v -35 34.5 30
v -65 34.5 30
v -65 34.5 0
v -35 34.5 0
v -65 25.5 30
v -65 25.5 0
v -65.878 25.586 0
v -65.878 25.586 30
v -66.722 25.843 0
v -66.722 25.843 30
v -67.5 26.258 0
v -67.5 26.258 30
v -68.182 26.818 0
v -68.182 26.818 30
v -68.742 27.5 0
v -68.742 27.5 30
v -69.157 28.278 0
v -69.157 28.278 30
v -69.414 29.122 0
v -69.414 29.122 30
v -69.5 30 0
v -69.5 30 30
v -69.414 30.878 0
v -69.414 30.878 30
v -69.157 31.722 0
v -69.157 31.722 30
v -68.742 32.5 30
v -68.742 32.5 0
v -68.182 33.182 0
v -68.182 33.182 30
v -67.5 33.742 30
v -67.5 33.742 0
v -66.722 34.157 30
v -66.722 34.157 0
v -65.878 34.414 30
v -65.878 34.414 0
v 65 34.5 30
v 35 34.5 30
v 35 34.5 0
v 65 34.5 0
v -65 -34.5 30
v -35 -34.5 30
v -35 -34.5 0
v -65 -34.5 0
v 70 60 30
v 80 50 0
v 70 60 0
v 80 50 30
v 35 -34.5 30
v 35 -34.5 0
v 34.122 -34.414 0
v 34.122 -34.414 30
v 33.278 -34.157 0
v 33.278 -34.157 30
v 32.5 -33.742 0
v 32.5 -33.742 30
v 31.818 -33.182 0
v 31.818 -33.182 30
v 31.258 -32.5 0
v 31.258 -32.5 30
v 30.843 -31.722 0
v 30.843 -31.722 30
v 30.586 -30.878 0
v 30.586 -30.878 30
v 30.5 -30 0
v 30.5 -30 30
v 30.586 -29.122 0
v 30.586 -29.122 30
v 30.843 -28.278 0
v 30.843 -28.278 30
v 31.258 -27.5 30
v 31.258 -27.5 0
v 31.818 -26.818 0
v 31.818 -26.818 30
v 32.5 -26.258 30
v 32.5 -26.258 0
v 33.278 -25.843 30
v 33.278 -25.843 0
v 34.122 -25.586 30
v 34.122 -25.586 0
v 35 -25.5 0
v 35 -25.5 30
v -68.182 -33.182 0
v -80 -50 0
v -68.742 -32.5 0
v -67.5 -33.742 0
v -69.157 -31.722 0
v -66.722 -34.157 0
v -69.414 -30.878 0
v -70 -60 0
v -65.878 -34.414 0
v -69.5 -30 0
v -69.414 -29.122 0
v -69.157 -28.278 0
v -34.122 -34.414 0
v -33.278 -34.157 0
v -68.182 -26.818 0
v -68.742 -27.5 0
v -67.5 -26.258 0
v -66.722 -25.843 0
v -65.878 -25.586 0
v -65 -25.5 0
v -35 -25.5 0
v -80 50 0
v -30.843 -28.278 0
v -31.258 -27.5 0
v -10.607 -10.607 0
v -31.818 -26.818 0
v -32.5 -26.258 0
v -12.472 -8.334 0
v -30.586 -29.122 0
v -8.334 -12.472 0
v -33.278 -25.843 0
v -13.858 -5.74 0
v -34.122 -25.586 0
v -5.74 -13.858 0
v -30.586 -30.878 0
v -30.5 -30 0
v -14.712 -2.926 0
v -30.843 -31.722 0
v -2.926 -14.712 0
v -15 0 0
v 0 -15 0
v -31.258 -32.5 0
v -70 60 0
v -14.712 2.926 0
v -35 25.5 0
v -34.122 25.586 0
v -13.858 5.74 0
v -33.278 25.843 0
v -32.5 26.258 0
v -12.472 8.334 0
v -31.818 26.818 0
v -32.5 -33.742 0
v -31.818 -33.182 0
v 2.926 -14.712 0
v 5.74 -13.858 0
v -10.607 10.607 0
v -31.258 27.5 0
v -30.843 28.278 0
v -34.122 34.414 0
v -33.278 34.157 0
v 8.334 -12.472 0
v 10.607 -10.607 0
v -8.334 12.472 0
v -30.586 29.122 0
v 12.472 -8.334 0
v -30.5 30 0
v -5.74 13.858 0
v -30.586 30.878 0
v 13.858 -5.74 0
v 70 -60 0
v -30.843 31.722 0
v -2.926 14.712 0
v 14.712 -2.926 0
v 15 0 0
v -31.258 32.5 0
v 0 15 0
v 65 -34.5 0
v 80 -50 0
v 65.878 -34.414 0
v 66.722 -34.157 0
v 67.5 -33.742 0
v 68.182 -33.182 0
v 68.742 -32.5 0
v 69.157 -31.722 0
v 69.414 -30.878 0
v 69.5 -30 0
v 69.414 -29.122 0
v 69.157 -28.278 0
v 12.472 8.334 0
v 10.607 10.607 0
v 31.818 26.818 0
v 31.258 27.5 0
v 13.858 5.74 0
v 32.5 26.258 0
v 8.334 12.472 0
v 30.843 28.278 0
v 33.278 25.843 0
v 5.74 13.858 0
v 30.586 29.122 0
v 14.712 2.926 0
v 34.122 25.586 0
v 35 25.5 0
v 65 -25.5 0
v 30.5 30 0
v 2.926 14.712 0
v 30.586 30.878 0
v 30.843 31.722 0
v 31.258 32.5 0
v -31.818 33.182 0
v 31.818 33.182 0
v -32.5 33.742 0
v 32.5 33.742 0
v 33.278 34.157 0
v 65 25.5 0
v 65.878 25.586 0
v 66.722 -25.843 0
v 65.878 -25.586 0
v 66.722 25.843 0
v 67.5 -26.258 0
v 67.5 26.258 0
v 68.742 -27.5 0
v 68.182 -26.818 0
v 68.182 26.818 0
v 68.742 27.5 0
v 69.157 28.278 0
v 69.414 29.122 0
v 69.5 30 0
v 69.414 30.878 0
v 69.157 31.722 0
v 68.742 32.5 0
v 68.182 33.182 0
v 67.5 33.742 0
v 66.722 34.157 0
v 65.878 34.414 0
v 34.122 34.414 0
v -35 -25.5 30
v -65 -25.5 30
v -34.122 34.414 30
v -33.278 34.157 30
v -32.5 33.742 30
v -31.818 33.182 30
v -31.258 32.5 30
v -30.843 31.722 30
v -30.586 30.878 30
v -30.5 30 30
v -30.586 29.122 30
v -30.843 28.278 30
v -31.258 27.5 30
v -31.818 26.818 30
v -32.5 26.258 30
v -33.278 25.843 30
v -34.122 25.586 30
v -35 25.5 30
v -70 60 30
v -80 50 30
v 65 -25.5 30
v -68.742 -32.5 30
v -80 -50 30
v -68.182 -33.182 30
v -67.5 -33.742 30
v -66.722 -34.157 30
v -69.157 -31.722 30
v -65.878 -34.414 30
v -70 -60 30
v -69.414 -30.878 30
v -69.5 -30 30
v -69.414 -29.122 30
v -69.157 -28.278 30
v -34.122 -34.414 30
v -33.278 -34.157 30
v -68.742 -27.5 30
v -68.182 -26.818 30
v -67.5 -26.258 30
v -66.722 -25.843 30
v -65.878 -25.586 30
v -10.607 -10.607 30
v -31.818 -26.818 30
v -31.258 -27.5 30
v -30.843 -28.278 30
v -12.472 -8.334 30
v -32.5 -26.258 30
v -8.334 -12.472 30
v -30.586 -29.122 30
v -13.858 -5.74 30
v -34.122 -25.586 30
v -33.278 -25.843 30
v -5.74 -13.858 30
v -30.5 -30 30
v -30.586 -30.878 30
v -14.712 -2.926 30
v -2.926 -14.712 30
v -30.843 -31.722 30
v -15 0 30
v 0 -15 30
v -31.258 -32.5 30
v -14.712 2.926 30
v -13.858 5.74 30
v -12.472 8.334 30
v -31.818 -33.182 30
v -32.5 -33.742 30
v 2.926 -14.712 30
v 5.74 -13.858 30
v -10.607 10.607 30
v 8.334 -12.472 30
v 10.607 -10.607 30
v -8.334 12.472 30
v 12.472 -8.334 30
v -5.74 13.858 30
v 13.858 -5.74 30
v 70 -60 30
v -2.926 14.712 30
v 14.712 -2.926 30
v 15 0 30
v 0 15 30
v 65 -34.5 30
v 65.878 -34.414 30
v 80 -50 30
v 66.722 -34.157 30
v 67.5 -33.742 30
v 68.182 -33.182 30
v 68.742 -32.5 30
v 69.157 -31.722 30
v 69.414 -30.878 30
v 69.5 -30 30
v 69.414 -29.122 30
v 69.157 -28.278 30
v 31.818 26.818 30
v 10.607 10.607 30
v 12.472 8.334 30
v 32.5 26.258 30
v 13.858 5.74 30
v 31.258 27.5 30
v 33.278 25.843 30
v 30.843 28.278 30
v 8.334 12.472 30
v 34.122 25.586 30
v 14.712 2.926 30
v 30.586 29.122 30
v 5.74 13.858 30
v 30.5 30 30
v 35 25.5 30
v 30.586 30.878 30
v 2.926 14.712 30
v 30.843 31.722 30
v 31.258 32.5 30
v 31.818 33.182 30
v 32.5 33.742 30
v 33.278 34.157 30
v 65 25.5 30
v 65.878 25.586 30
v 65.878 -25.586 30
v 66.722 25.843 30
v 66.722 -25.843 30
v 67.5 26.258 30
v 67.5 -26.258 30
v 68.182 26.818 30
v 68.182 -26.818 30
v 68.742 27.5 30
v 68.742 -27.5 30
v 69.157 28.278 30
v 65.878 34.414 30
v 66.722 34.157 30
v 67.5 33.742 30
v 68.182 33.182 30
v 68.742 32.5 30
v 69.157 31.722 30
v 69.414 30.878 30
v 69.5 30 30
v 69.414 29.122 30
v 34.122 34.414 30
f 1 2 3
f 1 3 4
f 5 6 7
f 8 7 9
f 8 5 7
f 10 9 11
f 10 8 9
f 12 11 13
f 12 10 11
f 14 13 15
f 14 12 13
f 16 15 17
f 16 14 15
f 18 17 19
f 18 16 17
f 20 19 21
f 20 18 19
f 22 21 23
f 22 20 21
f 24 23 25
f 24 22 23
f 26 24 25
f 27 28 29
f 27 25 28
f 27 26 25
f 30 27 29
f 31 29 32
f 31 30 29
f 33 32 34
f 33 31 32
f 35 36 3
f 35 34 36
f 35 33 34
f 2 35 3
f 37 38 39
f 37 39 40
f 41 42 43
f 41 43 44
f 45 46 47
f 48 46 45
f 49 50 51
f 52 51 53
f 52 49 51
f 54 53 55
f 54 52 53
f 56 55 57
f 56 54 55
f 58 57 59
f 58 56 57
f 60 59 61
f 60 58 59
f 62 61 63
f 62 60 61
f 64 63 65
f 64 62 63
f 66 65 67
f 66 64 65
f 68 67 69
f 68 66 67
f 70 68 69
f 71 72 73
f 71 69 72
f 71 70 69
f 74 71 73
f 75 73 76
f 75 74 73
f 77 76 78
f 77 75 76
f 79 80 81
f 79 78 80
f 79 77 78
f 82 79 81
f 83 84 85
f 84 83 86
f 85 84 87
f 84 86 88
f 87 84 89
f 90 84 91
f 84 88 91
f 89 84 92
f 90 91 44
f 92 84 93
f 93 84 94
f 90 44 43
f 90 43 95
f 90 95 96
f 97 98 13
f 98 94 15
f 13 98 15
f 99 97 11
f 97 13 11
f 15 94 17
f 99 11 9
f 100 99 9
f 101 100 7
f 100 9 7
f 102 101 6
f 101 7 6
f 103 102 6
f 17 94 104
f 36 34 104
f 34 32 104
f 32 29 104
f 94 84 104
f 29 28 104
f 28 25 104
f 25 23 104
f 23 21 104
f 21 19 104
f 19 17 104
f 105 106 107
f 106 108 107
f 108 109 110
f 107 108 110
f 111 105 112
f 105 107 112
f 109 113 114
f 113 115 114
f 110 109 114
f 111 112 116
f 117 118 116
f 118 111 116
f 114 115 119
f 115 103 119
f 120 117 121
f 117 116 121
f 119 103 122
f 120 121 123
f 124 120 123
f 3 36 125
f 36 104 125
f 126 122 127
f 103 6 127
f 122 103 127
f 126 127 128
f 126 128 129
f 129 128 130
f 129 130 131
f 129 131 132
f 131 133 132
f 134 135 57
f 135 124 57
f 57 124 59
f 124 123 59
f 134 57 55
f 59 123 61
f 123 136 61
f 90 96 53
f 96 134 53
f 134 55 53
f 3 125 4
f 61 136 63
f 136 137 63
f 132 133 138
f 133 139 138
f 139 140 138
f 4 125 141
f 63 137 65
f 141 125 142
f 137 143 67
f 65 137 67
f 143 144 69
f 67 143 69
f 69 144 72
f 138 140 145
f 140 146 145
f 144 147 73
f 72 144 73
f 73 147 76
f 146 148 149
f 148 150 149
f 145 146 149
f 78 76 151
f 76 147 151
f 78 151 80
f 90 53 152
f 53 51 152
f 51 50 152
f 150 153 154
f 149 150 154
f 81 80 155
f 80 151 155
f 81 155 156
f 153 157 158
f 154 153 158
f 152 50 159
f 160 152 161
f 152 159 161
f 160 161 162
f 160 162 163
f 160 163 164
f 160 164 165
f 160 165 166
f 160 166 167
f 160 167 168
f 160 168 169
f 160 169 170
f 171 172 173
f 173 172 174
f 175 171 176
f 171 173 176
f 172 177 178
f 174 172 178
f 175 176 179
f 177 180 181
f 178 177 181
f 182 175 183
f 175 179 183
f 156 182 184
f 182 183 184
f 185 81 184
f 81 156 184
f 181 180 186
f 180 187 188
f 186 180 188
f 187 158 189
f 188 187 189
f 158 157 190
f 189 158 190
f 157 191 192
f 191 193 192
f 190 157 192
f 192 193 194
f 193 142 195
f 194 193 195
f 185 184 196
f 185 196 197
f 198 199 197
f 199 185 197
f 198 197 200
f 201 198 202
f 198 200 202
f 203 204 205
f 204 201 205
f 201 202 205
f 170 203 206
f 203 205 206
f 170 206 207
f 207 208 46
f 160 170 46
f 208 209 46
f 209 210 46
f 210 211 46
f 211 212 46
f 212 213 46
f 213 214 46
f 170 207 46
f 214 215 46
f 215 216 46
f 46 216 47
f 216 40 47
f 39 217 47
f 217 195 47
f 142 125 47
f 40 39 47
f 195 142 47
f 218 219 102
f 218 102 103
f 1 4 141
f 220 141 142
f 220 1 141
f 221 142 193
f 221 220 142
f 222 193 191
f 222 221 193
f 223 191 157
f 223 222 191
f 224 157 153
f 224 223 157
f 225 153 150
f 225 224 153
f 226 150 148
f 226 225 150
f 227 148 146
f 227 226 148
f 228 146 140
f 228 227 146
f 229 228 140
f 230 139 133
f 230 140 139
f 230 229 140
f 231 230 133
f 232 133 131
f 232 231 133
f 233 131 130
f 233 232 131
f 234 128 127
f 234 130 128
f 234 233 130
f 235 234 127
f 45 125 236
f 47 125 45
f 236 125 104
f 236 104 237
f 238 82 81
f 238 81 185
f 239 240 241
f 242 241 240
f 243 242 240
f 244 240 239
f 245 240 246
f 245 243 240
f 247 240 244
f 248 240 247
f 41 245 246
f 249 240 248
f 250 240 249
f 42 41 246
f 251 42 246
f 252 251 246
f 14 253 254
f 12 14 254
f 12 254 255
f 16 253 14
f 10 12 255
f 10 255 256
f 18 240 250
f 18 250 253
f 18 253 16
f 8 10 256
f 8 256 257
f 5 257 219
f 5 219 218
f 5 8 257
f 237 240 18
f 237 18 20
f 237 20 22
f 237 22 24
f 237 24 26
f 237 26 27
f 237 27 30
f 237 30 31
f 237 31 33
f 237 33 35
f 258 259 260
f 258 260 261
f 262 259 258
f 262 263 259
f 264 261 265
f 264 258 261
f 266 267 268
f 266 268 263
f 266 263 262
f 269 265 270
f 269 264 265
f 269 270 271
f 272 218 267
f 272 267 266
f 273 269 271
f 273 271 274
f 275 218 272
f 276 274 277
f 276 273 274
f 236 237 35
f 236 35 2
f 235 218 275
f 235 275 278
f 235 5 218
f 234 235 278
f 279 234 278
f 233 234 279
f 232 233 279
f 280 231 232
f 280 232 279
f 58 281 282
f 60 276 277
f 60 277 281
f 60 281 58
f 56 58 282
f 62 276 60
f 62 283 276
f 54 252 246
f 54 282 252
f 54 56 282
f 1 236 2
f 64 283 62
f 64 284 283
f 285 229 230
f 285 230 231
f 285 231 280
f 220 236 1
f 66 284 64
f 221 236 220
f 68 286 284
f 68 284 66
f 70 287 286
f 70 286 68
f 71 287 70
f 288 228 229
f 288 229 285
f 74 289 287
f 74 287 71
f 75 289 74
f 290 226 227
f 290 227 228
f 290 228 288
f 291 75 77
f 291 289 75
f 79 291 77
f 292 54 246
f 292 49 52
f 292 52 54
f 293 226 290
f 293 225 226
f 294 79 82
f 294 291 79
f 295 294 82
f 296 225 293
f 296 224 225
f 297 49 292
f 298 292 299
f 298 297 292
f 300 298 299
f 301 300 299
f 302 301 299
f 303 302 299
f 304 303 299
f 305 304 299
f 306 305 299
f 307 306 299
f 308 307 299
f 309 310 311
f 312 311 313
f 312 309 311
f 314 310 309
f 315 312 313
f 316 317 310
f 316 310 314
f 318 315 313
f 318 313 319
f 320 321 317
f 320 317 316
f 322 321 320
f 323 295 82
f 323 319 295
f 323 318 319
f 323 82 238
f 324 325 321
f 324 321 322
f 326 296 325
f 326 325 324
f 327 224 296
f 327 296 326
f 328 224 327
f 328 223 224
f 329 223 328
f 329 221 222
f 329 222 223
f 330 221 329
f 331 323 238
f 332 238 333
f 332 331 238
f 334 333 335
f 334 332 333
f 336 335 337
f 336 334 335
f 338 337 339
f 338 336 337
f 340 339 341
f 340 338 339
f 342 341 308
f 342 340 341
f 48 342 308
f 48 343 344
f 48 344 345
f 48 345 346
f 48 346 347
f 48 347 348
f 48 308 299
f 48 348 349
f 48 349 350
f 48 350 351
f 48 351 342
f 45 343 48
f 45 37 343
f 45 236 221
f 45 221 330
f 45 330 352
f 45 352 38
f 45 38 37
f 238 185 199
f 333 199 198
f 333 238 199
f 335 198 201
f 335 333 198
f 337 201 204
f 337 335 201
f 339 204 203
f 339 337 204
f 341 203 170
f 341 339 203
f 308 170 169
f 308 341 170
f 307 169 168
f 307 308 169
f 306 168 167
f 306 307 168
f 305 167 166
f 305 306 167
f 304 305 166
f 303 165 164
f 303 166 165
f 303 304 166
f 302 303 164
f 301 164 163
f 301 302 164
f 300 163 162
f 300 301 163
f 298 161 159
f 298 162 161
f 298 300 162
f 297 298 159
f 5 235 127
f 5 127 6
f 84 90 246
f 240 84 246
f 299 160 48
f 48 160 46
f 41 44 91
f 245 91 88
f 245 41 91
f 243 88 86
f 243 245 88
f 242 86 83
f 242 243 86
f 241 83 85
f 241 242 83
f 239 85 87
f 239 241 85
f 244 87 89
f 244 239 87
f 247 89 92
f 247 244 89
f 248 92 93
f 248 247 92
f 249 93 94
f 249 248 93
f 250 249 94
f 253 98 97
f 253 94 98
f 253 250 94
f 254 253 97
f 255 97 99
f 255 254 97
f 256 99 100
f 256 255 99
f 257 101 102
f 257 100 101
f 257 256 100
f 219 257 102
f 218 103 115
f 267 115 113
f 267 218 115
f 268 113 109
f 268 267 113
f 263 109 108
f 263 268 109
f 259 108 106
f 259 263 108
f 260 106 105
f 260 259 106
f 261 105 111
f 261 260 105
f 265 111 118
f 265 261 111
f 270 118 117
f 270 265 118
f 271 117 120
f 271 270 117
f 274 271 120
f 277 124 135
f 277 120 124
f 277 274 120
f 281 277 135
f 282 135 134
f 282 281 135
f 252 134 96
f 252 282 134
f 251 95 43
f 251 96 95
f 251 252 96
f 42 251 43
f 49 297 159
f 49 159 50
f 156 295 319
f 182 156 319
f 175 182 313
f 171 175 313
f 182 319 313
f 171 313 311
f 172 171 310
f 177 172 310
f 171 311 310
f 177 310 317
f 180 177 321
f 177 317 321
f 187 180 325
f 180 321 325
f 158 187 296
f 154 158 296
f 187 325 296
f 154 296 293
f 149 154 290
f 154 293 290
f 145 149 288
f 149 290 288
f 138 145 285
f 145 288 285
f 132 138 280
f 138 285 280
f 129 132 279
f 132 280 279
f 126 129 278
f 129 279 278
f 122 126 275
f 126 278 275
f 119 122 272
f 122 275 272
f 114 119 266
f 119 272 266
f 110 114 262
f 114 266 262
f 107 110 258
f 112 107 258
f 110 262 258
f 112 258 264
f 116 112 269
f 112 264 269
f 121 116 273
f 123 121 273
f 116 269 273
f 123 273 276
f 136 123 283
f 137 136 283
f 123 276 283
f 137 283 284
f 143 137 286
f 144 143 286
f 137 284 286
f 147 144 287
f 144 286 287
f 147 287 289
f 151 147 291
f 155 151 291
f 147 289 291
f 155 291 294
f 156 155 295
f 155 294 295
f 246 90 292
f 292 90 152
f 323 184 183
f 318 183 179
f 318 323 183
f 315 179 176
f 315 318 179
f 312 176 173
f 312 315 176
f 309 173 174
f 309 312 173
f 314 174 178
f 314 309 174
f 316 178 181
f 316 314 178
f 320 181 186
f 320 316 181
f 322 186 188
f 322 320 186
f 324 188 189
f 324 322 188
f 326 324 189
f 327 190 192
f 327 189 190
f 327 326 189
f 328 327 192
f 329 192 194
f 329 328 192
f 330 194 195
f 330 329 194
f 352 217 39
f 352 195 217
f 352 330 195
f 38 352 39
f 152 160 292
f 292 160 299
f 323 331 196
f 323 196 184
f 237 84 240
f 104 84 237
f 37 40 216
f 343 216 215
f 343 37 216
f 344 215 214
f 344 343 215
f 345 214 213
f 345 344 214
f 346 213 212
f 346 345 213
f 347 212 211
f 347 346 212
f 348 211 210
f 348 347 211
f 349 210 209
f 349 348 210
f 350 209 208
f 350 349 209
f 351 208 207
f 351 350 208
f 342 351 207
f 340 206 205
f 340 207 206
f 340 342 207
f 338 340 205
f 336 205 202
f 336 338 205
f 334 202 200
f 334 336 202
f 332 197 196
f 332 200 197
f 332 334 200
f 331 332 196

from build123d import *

# Parameters (mm, degrees)
SKETCH_1_W          = 160
SKETCH_1_H          = 120
EXTRUDE_1_DEPTH     = 30
CUT_EXTRUDE_1_DEPTH = 31
CHAMFER_1_SIZE      = 10
SKETCH_3_R          = 15
CUT_EXTRUDE_2_DEPTH = 30


with BuildPart() as part:
    # 草图1 → 凸台-拉伸1 (new body)
    with BuildSketch(Plane.XY):
        Rectangle(SKETCH_1_W, SKETCH_1_H)
    extrude(amount=EXTRUDE_1_DEPTH)

    # 草图2 → 切除-拉伸1 (cut, through all)
    with BuildSketch(Plane.XY.offset(30)):
        with BuildLine():
            Line((-65, 34.5), (-35, 34.5))
            ThreePointArc((-35, 34.5), (-30.5, 30), (-35, 25.5))
            Line((-35, 25.5), (-65, 25.5))
            ThreePointArc((-65, 25.5), (-69.5, 30), (-65, 34.5))
        make_face()
        with BuildLine():
            Line((65, 25.5), (35, 25.5))
            ThreePointArc((35, 25.5), (30.5, 30), (35, 34.5))
            Line((35, 34.5), (65, 34.5))
            ThreePointArc((65, 34.5), (69.5, 30), (65, 25.5))
        make_face()
        with BuildLine():
            Line((-65, -25.5), (-35, -25.5))
            ThreePointArc((-35, -25.5), (-30.5, -30), (-35, -34.5))
            Line((-35, -34.5), (-65, -34.5))
            ThreePointArc((-65, -34.5), (-69.5, -30), (-65, -25.5))
        make_face()
        with BuildLine():
            Line((65, -34.5), (35, -34.5))
            ThreePointArc((35, -34.5), (30.5, -30), (35, -25.5))
            Line((35, -25.5), (65, -25.5))
            ThreePointArc((65, -25.5), (69.5, -30), (65, -34.5))
        make_face()
    extrude(amount=-CUT_EXTRUDE_1_DEPTH, mode=Mode.SUBTRACT)

    # 倒角1
    chamfer_1_edges = [part.edges().sort_by_distance(p)[0] for p in [
        (-80, 60, 15),
        (80, 60, 15),
        (80, -60, 15),
        (-80, -60, 15),
    ]]
    chamfer(chamfer_1_edges, length=CHAMFER_1_SIZE)

    # 草图3 → 切除-拉伸2 (cut)
    with BuildSketch(Plane.XY.offset(30)):
        Circle(SKETCH_3_R)
    extrude(amount=-CUT_EXTRUDE_2_DEPTH, mode=Mode.SUBTRACT)


solid = part.part
